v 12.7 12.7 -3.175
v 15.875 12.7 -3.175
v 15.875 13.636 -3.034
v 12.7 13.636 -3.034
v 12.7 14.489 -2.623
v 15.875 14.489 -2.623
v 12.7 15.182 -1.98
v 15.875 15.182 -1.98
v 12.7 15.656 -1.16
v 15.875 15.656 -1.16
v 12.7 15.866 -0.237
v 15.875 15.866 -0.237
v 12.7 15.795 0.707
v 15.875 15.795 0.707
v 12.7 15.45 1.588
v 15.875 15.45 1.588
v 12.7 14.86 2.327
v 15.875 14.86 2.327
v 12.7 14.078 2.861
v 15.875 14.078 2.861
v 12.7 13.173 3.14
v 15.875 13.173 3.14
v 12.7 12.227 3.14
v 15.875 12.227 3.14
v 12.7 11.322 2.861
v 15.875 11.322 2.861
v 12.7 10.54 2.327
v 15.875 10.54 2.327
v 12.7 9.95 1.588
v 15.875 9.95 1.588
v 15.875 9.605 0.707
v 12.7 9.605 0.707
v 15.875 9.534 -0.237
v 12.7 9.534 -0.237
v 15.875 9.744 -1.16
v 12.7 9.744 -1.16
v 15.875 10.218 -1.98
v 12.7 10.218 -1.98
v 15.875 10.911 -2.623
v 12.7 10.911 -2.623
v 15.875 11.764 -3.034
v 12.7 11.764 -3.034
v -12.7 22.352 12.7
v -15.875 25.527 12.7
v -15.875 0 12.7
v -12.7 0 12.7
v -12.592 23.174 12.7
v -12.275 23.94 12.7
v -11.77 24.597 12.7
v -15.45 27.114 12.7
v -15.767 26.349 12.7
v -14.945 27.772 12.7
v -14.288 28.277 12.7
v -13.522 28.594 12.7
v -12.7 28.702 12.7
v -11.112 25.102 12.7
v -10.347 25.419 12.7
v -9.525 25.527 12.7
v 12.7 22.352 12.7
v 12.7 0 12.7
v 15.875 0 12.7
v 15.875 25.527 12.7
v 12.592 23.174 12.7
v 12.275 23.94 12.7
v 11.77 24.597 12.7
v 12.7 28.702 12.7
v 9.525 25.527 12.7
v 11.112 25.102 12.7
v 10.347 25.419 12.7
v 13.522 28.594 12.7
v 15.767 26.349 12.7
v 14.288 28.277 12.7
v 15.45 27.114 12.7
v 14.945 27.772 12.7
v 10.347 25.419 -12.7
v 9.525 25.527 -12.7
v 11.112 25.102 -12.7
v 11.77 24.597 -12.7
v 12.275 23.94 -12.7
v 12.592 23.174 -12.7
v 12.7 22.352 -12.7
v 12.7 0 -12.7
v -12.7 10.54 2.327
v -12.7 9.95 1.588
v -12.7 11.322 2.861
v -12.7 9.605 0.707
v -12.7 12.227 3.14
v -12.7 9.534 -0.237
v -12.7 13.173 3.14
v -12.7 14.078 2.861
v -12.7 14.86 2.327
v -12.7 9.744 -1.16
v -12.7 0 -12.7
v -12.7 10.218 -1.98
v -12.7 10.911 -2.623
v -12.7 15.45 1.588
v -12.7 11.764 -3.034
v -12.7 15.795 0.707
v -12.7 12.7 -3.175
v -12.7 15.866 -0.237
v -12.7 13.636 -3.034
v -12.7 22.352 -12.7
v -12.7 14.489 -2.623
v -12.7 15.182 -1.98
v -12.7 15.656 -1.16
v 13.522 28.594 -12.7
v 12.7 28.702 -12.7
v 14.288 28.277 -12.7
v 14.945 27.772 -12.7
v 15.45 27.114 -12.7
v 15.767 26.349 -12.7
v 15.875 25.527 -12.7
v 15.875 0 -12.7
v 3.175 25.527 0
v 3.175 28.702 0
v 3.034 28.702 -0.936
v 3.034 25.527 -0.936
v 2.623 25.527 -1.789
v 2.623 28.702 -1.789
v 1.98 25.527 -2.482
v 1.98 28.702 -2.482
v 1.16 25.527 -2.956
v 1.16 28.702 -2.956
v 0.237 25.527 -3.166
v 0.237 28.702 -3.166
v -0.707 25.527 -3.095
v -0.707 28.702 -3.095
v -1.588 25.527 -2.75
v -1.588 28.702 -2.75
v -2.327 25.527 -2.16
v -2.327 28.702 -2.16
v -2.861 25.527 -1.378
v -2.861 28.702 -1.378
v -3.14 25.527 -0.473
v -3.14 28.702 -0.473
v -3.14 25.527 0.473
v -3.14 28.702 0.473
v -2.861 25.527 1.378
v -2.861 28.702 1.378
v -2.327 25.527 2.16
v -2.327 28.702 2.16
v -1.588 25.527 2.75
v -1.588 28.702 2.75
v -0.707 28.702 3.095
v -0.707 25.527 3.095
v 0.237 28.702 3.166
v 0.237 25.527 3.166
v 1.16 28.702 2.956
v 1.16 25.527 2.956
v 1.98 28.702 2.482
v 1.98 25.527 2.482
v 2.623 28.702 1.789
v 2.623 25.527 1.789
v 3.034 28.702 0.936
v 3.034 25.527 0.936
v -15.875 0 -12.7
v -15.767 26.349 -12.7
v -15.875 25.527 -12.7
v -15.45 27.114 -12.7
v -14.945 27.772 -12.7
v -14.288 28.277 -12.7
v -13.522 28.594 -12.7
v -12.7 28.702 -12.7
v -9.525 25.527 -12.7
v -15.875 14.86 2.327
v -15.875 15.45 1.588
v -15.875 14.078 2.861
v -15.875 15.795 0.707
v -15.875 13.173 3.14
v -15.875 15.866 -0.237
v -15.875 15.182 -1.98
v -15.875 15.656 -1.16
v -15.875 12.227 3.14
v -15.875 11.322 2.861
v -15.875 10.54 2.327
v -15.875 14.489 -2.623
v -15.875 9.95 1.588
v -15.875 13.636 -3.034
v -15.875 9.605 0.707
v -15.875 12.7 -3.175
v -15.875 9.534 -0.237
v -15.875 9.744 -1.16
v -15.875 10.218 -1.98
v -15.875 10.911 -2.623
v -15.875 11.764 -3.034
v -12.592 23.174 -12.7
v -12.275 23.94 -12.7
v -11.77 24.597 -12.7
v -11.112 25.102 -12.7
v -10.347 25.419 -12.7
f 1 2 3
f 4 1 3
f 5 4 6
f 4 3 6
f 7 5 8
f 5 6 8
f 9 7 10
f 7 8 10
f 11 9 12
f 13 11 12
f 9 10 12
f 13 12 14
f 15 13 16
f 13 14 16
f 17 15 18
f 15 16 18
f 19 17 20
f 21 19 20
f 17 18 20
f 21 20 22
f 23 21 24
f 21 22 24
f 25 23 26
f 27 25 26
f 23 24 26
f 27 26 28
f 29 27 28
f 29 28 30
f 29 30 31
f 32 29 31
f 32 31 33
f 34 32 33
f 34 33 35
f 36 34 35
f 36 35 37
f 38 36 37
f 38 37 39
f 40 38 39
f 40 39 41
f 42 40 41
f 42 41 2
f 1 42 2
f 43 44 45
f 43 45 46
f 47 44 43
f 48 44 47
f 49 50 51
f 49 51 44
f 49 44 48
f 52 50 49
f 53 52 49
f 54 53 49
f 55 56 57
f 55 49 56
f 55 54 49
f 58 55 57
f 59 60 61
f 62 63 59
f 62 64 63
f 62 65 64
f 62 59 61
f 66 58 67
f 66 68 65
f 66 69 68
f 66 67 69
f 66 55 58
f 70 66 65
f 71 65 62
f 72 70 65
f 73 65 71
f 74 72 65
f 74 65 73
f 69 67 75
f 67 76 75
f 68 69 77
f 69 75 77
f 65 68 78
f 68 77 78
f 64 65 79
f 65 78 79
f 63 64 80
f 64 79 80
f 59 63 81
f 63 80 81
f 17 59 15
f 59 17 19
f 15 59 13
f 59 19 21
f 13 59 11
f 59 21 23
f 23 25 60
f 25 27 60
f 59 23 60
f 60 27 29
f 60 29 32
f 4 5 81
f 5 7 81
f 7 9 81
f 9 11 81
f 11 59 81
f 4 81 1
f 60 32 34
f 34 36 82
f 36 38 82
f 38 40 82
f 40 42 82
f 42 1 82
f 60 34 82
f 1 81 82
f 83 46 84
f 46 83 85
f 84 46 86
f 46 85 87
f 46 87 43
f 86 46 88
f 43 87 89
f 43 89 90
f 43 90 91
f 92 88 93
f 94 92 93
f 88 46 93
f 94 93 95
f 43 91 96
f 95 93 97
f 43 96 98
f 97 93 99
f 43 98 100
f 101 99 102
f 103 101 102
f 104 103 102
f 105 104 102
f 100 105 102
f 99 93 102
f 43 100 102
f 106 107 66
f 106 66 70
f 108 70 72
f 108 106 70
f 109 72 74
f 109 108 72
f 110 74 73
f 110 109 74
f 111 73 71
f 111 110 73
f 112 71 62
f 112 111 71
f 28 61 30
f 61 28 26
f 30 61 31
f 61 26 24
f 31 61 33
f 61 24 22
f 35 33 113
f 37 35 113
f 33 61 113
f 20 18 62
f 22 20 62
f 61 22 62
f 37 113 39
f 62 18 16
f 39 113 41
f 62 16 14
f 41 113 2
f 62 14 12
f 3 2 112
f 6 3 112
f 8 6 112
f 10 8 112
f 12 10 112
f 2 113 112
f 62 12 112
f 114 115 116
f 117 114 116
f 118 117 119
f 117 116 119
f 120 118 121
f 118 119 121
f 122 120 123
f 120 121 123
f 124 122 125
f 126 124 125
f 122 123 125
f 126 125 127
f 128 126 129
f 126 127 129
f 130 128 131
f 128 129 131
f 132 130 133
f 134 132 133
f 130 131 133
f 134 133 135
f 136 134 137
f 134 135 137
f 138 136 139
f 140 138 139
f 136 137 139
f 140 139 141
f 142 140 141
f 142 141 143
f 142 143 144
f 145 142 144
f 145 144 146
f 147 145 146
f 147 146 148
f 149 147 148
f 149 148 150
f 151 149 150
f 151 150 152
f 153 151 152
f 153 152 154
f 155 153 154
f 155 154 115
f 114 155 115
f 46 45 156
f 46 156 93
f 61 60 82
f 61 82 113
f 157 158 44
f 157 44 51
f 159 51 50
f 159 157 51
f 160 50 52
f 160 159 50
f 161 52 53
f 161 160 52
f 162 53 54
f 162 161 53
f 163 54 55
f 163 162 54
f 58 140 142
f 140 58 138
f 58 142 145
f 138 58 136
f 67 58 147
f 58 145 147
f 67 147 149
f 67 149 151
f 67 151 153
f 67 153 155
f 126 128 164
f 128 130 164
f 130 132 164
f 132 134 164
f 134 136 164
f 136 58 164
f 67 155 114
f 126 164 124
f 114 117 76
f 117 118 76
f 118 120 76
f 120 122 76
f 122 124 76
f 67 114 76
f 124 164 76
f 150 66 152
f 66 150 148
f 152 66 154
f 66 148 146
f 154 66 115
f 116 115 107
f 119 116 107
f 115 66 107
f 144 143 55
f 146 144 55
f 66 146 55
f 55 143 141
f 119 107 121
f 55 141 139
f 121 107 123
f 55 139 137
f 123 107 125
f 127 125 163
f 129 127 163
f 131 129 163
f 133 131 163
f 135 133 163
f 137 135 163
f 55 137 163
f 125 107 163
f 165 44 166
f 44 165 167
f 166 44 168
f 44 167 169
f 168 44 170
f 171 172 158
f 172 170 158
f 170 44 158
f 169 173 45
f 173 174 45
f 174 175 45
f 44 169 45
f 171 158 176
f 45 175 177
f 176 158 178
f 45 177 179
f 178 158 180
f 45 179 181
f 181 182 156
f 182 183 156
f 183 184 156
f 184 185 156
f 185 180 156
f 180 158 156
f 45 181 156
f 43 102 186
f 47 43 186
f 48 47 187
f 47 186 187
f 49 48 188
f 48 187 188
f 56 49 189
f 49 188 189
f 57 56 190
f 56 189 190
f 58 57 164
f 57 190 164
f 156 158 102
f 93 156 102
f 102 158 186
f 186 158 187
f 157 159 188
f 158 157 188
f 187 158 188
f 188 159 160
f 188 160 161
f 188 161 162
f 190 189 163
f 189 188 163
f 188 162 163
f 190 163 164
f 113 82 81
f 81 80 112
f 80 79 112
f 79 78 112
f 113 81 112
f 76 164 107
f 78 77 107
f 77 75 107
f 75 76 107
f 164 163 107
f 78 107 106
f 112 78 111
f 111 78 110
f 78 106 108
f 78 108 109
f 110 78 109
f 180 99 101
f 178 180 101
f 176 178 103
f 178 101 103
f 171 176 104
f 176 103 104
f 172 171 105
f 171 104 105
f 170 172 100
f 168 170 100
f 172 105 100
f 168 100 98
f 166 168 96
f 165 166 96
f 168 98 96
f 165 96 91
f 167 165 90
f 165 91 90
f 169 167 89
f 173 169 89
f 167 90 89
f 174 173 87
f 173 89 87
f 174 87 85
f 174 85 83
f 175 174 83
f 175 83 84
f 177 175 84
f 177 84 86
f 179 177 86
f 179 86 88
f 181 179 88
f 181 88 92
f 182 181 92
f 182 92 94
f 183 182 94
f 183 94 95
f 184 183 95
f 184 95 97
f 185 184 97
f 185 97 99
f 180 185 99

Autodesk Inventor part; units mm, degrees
ref_plane "YZ Plane" through (0, 0, 0) normal (1, 0, 0) x (0, 1, 0)
ref_plane "XZ Plane" through (0, 0, 0) normal (0, 1, 0) x (-1, 0, 0)
ref_plane "XY Plane" through (0, 0, 0) normal (0, 0, 1) x (1, 0, 0)
sketch "Sketch1" plane through (0, 0, 0) normal (0, 0, 1) x (1, 0, 0)
  line L0 (-15.875, 0) -> (-12.7, 0)
  line L1 (-12.7, 0) -> (-12.7, 22.352)
  line L2 (-9.525, 25.527) -> (9.525, 25.527)
  line L3 (12.7, 22.352) -> (12.7, 0)
  line L4 (12.7, 0) -> (15.875, 0)
  line L5 (15.875, 0) -> (15.875, 25.527)
  line L6 (12.7, 28.702) -> (-12.7, 28.702)
  line L7 (-15.875, 25.527) -> (-15.875, 0)
  arc A0 (-9.525, 25.527) -> (-12.7, 22.352) centre (-9.525, 22.352) ccw
  arc A1 (12.7, 22.352) -> (9.525, 25.527) centre (9.525, 22.352) ccw
  arc A2 (-12.7, 28.702) -> (-15.875, 25.527) centre (-12.7, 25.527) ccw
  arc A3 (15.875, 25.527) -> (12.7, 28.702) centre (12.7, 25.527) ccw
  line L8 (0, 35.2315) -> (0, -5.8719) projected
  point P0 (0, 0)
  dimension "d0" = 28.702
  dimension "d1" = 31.75
  dimension "d2" = 3.175
  dimension "d3" = 3.175
  dimension "d4" = 3.175
extrude "Extrusion1" add sketch "Sketch1" along normal mid plane 25.4
sketch "Sketch4" plane through (15.875, 0, 12.7) normal (1, 0, 0) x (0, 0, -1)
  line L0 (12.7, -5.7404) -> (12.7, 34.4424) construction
  line L1 (-140.335, 0) -> (842.01, 0) construction
  circle A0 centre (12.7, 12.7) radius 3.175
  point P0 (12.7, 0)
  dimension "d34" = 12.7
  dimension "d35" = 0
  dimension "d36" = 6.35
extrude "Extrusion4" cut sketch "Sketch4" against normal up to surface (31.75 mm away)
pattern_linear "Rectangular Pattern3" count 30 spacing 25.4 along (0, 0, 1) count 30 spacing 25.4 along (0, 0, -1) of "Extrusion4"
sketch "Sketch5" plane through (-12.7, 28.702, 12.7) normal (0, 1, 0) x (1, 0, 0)
  circle A0 centre (12.7, 12.7) radius 3.175
  dimension "d45" = 6.35
extrude "Extrusion5" cut sketch "Sketch5" against normal up to next
equation "\"d5\" = AdaptLength"
equation "\"AdaptLength\" = 25.4"
properties part number "NSupportChannel2"
